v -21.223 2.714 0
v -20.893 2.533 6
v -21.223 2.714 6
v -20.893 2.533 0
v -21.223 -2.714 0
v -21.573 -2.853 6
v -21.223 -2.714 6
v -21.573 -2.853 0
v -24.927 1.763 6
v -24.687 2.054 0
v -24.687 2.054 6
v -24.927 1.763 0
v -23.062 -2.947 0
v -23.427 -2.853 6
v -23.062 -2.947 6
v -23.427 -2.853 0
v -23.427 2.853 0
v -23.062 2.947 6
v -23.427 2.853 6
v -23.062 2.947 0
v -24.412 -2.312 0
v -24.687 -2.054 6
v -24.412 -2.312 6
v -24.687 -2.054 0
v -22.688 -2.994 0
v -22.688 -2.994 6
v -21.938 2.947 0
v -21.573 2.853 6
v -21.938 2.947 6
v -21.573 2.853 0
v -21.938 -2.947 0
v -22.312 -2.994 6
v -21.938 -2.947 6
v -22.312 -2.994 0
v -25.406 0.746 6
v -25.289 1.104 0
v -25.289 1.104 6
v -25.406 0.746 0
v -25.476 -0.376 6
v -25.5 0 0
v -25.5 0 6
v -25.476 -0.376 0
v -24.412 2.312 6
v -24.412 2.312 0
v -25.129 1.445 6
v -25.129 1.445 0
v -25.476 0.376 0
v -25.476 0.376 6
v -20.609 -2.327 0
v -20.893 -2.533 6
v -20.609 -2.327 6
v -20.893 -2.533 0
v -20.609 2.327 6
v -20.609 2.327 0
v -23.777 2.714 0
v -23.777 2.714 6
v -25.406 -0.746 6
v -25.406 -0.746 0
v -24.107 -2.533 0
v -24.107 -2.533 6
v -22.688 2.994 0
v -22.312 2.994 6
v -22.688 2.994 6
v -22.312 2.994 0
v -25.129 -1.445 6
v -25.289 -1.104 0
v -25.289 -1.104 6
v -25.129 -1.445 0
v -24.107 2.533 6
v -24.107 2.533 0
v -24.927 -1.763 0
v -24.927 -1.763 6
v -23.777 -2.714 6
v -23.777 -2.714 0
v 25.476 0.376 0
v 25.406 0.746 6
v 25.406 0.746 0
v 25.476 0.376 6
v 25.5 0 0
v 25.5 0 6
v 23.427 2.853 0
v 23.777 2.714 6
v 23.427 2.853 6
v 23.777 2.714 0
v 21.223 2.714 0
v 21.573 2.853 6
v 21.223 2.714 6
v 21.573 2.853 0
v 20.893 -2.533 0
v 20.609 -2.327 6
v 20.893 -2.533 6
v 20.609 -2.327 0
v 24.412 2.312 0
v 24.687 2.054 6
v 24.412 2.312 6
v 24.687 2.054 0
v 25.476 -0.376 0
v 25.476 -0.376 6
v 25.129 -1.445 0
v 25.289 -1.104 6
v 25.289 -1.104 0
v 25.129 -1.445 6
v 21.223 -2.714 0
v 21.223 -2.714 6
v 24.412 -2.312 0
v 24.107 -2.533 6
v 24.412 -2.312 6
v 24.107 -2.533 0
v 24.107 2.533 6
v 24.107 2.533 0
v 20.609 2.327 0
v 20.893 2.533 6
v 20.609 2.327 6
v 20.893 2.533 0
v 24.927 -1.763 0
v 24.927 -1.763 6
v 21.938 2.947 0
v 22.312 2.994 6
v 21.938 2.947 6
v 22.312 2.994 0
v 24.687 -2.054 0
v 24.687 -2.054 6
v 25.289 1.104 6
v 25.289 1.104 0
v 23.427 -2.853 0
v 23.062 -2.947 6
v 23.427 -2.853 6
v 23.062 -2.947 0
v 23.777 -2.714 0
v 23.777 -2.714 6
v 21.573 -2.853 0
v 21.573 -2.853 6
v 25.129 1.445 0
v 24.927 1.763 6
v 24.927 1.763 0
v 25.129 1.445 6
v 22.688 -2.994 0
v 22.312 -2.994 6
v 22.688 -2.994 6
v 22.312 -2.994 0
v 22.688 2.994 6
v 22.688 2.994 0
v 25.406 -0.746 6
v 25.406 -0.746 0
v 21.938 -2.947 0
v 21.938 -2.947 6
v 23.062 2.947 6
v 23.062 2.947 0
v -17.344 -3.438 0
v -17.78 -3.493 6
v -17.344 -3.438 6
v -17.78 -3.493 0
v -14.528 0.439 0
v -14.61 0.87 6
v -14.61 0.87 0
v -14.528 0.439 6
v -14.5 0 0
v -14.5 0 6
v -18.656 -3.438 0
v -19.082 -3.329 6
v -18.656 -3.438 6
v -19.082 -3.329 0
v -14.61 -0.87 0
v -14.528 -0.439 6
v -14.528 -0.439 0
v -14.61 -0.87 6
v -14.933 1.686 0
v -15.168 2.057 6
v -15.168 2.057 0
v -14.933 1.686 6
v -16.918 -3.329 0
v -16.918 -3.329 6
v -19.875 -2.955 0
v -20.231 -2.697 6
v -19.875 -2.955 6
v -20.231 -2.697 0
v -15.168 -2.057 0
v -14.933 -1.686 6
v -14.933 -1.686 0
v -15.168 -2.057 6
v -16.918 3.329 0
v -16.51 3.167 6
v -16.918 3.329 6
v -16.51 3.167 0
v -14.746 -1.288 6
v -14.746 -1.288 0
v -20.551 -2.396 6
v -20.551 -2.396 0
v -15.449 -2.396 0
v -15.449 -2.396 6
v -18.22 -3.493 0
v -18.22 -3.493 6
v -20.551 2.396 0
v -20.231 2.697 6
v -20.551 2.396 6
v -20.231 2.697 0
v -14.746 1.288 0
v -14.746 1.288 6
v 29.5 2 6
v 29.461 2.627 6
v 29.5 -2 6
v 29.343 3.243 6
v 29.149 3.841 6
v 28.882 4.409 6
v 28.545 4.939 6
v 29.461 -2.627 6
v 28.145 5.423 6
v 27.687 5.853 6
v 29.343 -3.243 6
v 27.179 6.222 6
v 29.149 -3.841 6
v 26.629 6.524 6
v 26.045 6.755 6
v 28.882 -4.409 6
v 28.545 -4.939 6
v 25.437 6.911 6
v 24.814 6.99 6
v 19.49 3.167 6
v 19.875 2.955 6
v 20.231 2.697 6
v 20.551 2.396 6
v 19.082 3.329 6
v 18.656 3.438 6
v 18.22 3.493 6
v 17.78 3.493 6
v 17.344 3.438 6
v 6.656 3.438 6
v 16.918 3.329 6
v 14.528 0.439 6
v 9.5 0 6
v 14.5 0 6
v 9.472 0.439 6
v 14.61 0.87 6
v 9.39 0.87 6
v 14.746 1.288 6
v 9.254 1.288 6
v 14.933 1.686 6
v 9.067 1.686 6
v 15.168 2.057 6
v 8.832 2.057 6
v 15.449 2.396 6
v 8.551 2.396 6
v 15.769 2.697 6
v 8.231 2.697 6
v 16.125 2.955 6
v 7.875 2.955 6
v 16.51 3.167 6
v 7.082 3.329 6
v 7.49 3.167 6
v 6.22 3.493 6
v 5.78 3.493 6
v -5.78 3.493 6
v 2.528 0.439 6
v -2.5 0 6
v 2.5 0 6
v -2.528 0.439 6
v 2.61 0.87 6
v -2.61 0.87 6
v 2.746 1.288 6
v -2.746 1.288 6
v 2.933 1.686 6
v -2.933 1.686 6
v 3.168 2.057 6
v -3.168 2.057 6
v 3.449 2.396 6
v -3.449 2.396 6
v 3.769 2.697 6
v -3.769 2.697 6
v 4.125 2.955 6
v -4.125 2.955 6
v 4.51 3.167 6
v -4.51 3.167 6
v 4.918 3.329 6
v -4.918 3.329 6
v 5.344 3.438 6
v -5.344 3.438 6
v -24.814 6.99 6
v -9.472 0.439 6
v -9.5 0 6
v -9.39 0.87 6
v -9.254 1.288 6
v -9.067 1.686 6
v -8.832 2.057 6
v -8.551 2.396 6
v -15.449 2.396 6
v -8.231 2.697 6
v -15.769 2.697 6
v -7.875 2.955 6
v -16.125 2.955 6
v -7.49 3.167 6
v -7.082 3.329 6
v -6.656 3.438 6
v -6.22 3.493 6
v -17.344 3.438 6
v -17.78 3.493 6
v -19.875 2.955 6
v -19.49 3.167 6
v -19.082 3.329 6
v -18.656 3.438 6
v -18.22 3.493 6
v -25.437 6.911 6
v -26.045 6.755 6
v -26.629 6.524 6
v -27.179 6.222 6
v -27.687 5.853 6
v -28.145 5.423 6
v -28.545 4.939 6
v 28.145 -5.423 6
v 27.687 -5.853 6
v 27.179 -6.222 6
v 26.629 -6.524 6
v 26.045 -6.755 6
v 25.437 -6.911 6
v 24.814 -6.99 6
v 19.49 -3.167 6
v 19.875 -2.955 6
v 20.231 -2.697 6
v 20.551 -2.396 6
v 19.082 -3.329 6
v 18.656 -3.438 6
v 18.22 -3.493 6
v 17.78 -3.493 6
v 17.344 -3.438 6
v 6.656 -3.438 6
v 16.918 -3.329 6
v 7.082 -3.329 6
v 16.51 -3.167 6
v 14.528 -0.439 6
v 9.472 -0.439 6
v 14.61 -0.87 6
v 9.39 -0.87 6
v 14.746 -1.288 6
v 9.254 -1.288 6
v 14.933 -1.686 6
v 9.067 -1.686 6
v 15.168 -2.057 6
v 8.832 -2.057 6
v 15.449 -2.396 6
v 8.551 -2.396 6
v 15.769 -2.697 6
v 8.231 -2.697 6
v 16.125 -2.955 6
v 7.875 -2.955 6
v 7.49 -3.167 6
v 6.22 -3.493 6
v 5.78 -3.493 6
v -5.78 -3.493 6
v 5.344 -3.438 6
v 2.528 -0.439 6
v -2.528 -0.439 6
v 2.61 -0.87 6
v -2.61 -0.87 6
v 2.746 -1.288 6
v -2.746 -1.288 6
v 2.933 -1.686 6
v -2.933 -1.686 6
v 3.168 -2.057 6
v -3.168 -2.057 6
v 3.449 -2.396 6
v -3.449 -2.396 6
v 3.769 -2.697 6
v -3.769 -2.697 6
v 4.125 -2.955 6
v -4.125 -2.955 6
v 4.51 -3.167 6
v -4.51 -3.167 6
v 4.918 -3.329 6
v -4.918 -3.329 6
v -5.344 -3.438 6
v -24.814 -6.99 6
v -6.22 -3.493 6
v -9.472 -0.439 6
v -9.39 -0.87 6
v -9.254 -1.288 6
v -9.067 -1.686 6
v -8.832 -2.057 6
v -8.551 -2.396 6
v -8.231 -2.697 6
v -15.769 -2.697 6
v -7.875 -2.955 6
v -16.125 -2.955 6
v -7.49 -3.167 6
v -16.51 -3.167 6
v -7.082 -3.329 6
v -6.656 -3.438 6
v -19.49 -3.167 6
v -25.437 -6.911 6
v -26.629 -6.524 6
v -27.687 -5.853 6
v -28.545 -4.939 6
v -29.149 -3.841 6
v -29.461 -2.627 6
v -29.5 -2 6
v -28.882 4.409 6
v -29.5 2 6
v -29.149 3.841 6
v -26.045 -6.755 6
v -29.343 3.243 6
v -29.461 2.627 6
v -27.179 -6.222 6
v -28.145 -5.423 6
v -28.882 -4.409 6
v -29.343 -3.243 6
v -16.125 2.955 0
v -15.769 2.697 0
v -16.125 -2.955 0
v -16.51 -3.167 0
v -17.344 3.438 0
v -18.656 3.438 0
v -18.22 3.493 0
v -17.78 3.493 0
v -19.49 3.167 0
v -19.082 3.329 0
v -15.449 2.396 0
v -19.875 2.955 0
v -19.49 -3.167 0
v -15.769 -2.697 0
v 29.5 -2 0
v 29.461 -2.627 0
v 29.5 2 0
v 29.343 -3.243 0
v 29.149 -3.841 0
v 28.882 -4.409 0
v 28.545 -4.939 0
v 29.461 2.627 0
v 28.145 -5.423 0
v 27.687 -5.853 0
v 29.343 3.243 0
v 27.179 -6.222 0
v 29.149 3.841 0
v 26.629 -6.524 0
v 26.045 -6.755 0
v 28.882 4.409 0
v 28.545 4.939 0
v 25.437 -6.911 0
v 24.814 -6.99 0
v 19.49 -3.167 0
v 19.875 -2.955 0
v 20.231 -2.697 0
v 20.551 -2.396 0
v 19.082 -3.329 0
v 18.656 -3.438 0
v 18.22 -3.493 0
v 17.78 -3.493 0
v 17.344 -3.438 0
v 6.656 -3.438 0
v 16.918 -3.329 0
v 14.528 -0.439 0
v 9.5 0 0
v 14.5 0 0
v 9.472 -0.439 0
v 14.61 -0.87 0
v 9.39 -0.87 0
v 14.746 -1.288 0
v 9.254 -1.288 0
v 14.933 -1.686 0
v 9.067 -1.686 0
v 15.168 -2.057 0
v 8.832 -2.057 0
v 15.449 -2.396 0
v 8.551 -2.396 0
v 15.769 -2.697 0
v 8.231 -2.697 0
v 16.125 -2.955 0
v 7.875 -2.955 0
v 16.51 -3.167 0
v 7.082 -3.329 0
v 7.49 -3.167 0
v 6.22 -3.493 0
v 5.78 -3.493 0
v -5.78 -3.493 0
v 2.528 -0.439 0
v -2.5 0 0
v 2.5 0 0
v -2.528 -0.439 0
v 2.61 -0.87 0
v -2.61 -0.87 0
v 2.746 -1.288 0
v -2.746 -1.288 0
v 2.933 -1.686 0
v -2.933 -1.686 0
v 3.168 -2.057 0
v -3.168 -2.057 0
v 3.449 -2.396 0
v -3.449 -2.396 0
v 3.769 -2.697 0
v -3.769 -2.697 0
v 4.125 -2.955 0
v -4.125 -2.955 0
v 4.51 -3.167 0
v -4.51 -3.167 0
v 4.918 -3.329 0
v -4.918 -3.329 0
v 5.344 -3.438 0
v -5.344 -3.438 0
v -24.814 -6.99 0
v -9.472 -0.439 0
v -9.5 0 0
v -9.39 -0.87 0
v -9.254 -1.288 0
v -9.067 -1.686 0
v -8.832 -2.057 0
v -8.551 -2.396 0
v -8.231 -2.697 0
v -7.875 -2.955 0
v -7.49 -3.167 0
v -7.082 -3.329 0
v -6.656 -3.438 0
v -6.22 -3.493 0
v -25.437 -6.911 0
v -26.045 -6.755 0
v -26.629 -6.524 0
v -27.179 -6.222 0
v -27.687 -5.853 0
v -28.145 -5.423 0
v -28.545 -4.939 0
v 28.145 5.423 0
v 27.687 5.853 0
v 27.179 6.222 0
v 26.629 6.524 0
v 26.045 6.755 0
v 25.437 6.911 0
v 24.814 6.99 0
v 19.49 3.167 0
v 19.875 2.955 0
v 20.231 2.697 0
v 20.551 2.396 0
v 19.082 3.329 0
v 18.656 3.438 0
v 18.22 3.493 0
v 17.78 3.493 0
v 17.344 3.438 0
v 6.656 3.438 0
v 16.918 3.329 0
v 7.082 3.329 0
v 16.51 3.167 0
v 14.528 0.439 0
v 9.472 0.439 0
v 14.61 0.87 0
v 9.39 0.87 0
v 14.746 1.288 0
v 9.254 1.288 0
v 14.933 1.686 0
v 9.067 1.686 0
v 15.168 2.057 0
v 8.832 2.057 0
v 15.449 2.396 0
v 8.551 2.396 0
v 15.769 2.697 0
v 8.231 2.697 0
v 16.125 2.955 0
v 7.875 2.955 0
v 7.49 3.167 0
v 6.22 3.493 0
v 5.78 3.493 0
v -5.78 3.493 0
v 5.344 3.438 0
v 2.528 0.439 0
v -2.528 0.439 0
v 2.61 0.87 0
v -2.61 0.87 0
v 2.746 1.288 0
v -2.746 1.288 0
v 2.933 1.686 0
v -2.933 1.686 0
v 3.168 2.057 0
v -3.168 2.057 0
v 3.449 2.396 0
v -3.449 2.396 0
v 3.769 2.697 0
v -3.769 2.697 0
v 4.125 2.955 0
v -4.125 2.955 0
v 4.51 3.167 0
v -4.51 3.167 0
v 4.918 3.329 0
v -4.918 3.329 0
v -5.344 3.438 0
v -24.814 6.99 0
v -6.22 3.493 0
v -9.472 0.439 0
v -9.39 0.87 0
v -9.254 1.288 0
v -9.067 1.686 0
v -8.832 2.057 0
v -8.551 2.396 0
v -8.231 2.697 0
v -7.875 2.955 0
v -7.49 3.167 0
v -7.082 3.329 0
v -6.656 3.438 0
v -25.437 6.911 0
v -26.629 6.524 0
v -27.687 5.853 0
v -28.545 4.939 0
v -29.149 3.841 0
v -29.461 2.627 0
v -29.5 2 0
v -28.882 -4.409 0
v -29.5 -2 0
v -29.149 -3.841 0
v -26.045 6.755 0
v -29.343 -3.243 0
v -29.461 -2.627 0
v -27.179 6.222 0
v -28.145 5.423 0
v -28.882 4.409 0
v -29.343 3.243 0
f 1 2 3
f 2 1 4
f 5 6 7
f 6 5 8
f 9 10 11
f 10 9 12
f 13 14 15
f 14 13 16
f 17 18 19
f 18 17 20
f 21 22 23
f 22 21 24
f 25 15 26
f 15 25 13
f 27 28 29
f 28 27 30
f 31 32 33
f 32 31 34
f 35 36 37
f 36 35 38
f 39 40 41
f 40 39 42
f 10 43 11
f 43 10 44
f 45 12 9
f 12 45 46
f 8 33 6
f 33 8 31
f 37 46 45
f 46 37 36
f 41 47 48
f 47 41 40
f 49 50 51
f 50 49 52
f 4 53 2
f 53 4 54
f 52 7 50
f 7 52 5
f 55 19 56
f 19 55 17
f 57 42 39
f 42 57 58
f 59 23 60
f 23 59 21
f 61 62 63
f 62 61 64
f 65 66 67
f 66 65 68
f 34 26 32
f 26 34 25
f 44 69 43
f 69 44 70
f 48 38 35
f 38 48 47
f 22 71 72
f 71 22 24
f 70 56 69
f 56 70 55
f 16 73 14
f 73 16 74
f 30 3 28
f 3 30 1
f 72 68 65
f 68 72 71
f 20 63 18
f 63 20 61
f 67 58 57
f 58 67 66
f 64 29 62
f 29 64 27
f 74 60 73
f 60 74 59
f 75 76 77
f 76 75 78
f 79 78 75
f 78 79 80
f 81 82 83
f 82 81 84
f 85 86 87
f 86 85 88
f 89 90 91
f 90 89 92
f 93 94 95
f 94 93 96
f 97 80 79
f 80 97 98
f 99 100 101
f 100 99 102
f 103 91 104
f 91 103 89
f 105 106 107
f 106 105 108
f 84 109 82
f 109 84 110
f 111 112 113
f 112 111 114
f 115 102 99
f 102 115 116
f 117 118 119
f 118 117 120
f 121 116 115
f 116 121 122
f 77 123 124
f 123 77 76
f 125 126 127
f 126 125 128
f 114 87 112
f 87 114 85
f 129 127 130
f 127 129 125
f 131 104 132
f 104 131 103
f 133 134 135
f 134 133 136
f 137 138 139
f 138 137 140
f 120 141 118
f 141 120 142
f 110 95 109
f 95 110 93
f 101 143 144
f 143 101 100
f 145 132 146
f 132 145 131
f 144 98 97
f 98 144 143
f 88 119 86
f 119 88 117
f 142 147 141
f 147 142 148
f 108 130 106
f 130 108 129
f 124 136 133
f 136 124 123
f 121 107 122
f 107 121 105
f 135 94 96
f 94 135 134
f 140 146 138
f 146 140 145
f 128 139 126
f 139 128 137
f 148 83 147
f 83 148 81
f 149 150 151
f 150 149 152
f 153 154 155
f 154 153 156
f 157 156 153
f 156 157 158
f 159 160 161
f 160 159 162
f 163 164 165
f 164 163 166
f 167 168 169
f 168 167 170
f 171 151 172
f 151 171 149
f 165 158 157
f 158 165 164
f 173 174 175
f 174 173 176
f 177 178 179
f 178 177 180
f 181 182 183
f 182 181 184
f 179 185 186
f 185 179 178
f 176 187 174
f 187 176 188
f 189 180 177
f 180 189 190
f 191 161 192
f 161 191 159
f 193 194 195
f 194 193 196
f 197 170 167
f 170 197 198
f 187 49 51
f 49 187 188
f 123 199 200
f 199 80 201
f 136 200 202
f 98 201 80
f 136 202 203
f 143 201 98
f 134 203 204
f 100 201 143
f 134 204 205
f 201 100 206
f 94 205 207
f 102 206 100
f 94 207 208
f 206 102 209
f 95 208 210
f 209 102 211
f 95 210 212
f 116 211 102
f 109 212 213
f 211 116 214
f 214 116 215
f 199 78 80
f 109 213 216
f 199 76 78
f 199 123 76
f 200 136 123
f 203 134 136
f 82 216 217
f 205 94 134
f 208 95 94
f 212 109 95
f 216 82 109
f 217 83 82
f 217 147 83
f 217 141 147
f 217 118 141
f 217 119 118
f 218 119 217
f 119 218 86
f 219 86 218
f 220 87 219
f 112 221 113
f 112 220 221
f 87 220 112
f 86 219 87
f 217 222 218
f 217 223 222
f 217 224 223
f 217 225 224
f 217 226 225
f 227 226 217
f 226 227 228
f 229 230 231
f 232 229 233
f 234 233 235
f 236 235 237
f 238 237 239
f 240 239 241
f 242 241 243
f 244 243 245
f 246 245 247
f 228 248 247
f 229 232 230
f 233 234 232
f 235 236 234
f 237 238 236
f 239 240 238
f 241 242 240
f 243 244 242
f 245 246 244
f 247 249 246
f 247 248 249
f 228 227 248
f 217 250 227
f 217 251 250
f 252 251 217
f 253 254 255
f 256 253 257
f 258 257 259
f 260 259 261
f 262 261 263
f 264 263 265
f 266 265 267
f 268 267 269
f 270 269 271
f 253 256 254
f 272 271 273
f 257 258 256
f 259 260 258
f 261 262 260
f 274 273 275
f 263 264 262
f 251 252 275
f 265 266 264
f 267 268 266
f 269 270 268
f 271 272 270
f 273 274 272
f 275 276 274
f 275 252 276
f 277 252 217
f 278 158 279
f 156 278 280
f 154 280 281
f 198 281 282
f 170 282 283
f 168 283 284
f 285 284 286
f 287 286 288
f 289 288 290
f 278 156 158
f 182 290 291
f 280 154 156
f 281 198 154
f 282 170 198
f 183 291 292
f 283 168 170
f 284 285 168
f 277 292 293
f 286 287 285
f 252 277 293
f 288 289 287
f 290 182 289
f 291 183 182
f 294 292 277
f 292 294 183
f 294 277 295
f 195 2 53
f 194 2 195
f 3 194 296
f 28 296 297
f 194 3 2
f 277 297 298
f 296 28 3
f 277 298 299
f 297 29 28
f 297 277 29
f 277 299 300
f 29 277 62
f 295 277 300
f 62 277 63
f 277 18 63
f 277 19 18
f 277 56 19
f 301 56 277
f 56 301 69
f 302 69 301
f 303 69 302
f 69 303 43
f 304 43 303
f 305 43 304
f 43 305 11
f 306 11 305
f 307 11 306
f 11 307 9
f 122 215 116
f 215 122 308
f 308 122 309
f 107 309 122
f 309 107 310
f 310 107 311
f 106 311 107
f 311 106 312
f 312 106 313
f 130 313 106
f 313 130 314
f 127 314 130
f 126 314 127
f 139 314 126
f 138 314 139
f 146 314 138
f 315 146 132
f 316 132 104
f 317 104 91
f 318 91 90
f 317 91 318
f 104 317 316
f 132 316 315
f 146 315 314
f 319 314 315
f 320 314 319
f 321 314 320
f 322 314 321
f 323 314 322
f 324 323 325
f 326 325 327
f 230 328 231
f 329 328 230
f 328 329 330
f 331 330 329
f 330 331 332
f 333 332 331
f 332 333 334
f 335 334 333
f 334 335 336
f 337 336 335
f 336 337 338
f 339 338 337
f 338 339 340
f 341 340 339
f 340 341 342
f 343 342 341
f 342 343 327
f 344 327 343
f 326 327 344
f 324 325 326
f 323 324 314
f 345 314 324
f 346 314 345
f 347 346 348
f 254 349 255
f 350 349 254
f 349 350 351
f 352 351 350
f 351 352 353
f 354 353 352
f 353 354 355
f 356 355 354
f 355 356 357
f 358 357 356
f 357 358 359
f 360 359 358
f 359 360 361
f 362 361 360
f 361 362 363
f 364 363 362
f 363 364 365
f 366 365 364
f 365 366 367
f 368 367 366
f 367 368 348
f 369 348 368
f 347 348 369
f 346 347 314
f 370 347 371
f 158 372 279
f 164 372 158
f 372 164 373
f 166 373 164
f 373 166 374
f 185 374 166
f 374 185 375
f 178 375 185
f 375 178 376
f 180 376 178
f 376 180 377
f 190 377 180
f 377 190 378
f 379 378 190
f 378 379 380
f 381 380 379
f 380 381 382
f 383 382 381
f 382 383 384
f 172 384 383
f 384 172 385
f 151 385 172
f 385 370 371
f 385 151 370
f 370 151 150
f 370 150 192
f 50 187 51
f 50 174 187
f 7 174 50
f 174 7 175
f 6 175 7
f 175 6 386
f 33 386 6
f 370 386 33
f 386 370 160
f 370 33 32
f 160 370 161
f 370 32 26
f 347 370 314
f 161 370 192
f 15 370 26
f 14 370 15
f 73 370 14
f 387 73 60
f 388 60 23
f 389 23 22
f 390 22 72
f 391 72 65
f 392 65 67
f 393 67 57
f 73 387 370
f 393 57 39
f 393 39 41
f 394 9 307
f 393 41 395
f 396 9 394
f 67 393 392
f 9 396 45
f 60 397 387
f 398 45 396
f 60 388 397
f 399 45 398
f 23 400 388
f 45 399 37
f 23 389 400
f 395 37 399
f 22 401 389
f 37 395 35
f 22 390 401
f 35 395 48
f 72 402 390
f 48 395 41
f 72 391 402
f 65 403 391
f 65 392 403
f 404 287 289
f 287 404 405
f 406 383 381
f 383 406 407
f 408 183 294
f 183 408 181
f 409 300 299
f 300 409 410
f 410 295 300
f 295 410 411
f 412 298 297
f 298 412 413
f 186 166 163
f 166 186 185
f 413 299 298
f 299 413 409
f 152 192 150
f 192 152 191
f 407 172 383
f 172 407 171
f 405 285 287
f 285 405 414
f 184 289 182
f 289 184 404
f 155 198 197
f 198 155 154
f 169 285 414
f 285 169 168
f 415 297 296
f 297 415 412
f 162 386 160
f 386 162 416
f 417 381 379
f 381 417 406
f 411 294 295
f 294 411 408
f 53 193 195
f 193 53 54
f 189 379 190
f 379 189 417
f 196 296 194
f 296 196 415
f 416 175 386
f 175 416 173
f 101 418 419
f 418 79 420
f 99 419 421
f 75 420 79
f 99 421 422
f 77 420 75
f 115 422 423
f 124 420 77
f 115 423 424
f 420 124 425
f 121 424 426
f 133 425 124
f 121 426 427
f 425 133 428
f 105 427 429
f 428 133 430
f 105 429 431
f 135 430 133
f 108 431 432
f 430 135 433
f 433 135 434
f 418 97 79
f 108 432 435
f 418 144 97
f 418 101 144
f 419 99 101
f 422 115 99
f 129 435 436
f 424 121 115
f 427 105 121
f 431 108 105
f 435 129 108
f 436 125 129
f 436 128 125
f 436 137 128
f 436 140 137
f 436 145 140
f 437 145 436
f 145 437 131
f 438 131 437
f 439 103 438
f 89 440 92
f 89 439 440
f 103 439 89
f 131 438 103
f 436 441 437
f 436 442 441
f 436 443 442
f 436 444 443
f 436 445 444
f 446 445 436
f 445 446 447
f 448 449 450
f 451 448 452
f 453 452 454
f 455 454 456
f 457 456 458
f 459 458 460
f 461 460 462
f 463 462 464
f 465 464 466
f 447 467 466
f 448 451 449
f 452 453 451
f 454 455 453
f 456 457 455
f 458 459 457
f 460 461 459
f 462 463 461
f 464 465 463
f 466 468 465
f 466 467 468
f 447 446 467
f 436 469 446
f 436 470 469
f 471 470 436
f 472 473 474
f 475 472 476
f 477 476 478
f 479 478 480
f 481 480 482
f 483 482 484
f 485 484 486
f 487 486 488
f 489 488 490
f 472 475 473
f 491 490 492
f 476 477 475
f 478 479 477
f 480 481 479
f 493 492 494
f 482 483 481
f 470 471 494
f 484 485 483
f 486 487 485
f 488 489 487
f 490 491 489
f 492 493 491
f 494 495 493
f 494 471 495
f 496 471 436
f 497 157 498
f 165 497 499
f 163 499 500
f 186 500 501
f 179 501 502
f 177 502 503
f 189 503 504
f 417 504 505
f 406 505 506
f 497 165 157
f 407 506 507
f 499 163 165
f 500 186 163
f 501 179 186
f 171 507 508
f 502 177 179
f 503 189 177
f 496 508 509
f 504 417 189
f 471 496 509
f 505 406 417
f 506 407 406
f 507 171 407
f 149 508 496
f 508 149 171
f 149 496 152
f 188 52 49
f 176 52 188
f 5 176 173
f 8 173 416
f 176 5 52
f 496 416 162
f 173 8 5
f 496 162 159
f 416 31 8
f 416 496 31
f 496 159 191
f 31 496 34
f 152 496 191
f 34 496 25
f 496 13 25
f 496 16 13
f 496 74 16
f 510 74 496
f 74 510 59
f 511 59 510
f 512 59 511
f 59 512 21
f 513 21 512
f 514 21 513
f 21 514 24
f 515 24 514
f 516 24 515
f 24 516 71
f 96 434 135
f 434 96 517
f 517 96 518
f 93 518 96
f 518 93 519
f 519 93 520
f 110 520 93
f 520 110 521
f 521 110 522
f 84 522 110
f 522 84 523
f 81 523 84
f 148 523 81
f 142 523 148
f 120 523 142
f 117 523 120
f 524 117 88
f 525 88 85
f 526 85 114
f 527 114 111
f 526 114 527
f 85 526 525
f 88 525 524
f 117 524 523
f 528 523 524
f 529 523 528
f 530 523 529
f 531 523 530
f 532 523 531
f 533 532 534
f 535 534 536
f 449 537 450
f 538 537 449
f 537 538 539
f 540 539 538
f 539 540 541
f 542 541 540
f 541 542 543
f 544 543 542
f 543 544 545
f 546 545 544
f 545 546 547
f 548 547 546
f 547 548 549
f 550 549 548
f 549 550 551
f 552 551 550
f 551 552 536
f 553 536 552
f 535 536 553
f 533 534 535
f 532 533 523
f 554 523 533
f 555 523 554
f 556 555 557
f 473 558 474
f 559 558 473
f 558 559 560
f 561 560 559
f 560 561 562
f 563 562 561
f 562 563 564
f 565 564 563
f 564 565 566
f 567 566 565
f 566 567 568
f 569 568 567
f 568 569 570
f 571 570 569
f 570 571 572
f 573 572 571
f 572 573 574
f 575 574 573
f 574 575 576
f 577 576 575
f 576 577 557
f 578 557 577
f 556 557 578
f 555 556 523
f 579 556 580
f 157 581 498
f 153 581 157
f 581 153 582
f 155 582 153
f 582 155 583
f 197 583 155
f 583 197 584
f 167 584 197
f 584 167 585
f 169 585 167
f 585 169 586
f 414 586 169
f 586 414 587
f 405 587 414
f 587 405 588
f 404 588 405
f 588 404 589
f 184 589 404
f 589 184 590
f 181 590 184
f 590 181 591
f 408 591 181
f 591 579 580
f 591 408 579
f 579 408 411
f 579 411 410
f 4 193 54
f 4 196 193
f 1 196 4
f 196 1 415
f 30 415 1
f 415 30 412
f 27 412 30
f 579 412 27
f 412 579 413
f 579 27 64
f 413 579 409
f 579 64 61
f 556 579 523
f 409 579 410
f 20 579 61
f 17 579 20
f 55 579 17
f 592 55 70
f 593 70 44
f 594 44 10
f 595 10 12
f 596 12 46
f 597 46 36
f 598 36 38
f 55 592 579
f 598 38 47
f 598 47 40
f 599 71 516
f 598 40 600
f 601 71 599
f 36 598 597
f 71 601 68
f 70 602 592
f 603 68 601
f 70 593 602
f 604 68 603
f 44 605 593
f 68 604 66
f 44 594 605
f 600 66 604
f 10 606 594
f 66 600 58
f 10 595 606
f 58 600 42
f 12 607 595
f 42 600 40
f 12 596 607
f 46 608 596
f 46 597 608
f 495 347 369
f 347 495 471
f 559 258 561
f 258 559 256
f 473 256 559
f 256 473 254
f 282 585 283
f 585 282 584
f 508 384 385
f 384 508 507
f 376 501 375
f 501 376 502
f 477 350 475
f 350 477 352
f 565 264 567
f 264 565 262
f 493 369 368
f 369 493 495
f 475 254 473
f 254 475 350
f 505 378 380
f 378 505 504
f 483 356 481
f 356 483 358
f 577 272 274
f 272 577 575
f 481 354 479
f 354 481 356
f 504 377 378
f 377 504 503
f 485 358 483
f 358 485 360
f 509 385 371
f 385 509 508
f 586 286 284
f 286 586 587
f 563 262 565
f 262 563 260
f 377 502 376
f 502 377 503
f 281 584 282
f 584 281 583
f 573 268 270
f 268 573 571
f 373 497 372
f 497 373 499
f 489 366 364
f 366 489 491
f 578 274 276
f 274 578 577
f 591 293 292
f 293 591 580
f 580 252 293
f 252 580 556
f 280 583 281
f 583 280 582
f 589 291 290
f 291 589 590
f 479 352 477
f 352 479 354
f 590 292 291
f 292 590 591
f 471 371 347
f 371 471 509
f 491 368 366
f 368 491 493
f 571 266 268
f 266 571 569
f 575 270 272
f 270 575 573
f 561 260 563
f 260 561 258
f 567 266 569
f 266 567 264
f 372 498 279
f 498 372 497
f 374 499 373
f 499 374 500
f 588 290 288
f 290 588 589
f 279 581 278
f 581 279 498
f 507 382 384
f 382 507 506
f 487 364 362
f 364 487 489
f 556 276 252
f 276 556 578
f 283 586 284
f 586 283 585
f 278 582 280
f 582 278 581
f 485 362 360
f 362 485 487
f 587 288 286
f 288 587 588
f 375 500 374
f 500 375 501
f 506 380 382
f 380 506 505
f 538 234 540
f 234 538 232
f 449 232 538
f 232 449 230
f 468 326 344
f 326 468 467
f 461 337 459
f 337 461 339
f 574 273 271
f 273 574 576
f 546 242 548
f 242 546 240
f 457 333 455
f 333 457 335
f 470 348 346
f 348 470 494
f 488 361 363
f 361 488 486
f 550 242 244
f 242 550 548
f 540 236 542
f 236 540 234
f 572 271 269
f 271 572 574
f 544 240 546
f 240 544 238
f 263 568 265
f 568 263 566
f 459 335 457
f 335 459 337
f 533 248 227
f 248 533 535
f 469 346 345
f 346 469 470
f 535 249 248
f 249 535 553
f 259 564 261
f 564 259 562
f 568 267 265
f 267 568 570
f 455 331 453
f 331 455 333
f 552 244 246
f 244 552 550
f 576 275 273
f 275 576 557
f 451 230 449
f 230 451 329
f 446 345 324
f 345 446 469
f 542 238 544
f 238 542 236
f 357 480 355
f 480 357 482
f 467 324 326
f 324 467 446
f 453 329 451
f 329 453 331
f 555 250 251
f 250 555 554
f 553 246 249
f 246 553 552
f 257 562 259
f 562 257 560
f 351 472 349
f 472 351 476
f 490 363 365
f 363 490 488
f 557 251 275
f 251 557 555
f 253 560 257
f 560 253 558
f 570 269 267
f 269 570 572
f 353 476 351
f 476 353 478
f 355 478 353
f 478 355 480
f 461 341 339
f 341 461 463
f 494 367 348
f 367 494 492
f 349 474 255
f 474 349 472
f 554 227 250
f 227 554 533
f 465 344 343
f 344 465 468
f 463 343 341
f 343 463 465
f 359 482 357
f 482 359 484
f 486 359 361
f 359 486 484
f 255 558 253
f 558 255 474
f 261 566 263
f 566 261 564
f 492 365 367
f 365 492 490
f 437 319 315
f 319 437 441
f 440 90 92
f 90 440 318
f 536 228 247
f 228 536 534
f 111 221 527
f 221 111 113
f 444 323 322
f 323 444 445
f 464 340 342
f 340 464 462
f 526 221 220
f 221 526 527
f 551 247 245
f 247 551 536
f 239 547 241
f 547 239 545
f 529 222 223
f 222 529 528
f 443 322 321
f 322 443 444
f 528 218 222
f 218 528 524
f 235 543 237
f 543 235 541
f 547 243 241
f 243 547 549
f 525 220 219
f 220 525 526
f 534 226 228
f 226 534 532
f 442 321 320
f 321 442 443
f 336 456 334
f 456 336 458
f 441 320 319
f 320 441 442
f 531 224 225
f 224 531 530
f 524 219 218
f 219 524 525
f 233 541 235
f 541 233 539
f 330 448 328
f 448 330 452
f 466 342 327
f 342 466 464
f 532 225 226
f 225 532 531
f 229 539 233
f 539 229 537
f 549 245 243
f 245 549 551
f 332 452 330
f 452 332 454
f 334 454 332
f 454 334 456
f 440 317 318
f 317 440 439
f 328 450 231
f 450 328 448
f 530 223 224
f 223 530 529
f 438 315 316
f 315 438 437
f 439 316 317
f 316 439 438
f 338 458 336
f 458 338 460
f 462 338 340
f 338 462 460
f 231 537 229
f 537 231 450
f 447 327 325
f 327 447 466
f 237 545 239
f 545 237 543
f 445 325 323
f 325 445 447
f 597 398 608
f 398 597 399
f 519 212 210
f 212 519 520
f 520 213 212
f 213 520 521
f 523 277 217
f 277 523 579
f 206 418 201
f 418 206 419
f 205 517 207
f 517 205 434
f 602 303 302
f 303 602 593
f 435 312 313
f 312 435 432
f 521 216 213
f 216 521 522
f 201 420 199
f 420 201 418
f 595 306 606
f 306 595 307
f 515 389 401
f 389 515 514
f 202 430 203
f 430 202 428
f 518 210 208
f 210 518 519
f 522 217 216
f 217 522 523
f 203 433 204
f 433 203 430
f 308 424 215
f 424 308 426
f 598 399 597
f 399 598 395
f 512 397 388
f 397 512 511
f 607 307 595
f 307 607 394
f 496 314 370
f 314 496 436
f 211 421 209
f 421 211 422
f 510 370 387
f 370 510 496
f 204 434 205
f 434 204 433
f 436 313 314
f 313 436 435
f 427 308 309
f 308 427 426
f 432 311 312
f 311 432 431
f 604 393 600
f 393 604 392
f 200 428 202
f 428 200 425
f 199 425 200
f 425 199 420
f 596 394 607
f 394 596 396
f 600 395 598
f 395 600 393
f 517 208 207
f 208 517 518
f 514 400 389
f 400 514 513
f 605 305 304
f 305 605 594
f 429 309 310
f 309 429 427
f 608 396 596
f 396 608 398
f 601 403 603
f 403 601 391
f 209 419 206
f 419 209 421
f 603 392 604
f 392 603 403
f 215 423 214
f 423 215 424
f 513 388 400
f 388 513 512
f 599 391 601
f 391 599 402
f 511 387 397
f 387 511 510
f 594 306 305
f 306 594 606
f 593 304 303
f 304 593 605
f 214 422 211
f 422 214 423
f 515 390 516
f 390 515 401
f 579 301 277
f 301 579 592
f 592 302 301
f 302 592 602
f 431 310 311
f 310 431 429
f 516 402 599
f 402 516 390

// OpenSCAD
$fn = 50;


difference() {
	union() {
		hull() {
			translate(v = [-24.5000000000, 2.0000000000, 0]) {
				cylinder(h = 6, r = 5);
			}
			translate(v = [24.5000000000, 2.0000000000, 0]) {
				cylinder(h = 6, r = 5);
			}
			translate(v = [-24.5000000000, -2.0000000000, 0]) {
				cylinder(h = 6, r = 5);
			}
			translate(v = [24.5000000000, -2.0000000000, 0]) {
				cylinder(h = 6, r = 5);
			}
		}
	}
	union() {
		#translate(v = [-22.5000000000, 0.0000000000, -100.0000000000]) {
			cylinder(h = 200, r = 3.0000000000);
		}
		#translate(v = [-22.5000000000, 0.0000000000, -100.0000000000]) {
			cylinder(h = 200, r = 3.0000000000);
		}
		#translate(v = [22.5000000000, 0.0000000000, -100.0000000000]) {
			cylinder(h = 200, r = 3.0000000000);
		}
		#translate(v = [22.5000000000, 0.0000000000, -100.0000000000]) {
			cylinder(h = 200, r = 3.0000000000);
		}
		#translate(v = [-18.0000000000, 0, 0]) {
			cylinder(h = 6, r = 3.5000000000);
		}
		#translate(v = [-6.0000000000, 0, 0]) {
			cylinder(h = 6, r = 3.5000000000);
		}
		#translate(v = [6.0000000000, 0, 0]) {
			cylinder(h = 6, r = 3.5000000000);
		}
		#translate(v = [18.0000000000, 0, 0]) {
			cylinder(h = 6, r = 3.5000000000);
		}
	}
}
